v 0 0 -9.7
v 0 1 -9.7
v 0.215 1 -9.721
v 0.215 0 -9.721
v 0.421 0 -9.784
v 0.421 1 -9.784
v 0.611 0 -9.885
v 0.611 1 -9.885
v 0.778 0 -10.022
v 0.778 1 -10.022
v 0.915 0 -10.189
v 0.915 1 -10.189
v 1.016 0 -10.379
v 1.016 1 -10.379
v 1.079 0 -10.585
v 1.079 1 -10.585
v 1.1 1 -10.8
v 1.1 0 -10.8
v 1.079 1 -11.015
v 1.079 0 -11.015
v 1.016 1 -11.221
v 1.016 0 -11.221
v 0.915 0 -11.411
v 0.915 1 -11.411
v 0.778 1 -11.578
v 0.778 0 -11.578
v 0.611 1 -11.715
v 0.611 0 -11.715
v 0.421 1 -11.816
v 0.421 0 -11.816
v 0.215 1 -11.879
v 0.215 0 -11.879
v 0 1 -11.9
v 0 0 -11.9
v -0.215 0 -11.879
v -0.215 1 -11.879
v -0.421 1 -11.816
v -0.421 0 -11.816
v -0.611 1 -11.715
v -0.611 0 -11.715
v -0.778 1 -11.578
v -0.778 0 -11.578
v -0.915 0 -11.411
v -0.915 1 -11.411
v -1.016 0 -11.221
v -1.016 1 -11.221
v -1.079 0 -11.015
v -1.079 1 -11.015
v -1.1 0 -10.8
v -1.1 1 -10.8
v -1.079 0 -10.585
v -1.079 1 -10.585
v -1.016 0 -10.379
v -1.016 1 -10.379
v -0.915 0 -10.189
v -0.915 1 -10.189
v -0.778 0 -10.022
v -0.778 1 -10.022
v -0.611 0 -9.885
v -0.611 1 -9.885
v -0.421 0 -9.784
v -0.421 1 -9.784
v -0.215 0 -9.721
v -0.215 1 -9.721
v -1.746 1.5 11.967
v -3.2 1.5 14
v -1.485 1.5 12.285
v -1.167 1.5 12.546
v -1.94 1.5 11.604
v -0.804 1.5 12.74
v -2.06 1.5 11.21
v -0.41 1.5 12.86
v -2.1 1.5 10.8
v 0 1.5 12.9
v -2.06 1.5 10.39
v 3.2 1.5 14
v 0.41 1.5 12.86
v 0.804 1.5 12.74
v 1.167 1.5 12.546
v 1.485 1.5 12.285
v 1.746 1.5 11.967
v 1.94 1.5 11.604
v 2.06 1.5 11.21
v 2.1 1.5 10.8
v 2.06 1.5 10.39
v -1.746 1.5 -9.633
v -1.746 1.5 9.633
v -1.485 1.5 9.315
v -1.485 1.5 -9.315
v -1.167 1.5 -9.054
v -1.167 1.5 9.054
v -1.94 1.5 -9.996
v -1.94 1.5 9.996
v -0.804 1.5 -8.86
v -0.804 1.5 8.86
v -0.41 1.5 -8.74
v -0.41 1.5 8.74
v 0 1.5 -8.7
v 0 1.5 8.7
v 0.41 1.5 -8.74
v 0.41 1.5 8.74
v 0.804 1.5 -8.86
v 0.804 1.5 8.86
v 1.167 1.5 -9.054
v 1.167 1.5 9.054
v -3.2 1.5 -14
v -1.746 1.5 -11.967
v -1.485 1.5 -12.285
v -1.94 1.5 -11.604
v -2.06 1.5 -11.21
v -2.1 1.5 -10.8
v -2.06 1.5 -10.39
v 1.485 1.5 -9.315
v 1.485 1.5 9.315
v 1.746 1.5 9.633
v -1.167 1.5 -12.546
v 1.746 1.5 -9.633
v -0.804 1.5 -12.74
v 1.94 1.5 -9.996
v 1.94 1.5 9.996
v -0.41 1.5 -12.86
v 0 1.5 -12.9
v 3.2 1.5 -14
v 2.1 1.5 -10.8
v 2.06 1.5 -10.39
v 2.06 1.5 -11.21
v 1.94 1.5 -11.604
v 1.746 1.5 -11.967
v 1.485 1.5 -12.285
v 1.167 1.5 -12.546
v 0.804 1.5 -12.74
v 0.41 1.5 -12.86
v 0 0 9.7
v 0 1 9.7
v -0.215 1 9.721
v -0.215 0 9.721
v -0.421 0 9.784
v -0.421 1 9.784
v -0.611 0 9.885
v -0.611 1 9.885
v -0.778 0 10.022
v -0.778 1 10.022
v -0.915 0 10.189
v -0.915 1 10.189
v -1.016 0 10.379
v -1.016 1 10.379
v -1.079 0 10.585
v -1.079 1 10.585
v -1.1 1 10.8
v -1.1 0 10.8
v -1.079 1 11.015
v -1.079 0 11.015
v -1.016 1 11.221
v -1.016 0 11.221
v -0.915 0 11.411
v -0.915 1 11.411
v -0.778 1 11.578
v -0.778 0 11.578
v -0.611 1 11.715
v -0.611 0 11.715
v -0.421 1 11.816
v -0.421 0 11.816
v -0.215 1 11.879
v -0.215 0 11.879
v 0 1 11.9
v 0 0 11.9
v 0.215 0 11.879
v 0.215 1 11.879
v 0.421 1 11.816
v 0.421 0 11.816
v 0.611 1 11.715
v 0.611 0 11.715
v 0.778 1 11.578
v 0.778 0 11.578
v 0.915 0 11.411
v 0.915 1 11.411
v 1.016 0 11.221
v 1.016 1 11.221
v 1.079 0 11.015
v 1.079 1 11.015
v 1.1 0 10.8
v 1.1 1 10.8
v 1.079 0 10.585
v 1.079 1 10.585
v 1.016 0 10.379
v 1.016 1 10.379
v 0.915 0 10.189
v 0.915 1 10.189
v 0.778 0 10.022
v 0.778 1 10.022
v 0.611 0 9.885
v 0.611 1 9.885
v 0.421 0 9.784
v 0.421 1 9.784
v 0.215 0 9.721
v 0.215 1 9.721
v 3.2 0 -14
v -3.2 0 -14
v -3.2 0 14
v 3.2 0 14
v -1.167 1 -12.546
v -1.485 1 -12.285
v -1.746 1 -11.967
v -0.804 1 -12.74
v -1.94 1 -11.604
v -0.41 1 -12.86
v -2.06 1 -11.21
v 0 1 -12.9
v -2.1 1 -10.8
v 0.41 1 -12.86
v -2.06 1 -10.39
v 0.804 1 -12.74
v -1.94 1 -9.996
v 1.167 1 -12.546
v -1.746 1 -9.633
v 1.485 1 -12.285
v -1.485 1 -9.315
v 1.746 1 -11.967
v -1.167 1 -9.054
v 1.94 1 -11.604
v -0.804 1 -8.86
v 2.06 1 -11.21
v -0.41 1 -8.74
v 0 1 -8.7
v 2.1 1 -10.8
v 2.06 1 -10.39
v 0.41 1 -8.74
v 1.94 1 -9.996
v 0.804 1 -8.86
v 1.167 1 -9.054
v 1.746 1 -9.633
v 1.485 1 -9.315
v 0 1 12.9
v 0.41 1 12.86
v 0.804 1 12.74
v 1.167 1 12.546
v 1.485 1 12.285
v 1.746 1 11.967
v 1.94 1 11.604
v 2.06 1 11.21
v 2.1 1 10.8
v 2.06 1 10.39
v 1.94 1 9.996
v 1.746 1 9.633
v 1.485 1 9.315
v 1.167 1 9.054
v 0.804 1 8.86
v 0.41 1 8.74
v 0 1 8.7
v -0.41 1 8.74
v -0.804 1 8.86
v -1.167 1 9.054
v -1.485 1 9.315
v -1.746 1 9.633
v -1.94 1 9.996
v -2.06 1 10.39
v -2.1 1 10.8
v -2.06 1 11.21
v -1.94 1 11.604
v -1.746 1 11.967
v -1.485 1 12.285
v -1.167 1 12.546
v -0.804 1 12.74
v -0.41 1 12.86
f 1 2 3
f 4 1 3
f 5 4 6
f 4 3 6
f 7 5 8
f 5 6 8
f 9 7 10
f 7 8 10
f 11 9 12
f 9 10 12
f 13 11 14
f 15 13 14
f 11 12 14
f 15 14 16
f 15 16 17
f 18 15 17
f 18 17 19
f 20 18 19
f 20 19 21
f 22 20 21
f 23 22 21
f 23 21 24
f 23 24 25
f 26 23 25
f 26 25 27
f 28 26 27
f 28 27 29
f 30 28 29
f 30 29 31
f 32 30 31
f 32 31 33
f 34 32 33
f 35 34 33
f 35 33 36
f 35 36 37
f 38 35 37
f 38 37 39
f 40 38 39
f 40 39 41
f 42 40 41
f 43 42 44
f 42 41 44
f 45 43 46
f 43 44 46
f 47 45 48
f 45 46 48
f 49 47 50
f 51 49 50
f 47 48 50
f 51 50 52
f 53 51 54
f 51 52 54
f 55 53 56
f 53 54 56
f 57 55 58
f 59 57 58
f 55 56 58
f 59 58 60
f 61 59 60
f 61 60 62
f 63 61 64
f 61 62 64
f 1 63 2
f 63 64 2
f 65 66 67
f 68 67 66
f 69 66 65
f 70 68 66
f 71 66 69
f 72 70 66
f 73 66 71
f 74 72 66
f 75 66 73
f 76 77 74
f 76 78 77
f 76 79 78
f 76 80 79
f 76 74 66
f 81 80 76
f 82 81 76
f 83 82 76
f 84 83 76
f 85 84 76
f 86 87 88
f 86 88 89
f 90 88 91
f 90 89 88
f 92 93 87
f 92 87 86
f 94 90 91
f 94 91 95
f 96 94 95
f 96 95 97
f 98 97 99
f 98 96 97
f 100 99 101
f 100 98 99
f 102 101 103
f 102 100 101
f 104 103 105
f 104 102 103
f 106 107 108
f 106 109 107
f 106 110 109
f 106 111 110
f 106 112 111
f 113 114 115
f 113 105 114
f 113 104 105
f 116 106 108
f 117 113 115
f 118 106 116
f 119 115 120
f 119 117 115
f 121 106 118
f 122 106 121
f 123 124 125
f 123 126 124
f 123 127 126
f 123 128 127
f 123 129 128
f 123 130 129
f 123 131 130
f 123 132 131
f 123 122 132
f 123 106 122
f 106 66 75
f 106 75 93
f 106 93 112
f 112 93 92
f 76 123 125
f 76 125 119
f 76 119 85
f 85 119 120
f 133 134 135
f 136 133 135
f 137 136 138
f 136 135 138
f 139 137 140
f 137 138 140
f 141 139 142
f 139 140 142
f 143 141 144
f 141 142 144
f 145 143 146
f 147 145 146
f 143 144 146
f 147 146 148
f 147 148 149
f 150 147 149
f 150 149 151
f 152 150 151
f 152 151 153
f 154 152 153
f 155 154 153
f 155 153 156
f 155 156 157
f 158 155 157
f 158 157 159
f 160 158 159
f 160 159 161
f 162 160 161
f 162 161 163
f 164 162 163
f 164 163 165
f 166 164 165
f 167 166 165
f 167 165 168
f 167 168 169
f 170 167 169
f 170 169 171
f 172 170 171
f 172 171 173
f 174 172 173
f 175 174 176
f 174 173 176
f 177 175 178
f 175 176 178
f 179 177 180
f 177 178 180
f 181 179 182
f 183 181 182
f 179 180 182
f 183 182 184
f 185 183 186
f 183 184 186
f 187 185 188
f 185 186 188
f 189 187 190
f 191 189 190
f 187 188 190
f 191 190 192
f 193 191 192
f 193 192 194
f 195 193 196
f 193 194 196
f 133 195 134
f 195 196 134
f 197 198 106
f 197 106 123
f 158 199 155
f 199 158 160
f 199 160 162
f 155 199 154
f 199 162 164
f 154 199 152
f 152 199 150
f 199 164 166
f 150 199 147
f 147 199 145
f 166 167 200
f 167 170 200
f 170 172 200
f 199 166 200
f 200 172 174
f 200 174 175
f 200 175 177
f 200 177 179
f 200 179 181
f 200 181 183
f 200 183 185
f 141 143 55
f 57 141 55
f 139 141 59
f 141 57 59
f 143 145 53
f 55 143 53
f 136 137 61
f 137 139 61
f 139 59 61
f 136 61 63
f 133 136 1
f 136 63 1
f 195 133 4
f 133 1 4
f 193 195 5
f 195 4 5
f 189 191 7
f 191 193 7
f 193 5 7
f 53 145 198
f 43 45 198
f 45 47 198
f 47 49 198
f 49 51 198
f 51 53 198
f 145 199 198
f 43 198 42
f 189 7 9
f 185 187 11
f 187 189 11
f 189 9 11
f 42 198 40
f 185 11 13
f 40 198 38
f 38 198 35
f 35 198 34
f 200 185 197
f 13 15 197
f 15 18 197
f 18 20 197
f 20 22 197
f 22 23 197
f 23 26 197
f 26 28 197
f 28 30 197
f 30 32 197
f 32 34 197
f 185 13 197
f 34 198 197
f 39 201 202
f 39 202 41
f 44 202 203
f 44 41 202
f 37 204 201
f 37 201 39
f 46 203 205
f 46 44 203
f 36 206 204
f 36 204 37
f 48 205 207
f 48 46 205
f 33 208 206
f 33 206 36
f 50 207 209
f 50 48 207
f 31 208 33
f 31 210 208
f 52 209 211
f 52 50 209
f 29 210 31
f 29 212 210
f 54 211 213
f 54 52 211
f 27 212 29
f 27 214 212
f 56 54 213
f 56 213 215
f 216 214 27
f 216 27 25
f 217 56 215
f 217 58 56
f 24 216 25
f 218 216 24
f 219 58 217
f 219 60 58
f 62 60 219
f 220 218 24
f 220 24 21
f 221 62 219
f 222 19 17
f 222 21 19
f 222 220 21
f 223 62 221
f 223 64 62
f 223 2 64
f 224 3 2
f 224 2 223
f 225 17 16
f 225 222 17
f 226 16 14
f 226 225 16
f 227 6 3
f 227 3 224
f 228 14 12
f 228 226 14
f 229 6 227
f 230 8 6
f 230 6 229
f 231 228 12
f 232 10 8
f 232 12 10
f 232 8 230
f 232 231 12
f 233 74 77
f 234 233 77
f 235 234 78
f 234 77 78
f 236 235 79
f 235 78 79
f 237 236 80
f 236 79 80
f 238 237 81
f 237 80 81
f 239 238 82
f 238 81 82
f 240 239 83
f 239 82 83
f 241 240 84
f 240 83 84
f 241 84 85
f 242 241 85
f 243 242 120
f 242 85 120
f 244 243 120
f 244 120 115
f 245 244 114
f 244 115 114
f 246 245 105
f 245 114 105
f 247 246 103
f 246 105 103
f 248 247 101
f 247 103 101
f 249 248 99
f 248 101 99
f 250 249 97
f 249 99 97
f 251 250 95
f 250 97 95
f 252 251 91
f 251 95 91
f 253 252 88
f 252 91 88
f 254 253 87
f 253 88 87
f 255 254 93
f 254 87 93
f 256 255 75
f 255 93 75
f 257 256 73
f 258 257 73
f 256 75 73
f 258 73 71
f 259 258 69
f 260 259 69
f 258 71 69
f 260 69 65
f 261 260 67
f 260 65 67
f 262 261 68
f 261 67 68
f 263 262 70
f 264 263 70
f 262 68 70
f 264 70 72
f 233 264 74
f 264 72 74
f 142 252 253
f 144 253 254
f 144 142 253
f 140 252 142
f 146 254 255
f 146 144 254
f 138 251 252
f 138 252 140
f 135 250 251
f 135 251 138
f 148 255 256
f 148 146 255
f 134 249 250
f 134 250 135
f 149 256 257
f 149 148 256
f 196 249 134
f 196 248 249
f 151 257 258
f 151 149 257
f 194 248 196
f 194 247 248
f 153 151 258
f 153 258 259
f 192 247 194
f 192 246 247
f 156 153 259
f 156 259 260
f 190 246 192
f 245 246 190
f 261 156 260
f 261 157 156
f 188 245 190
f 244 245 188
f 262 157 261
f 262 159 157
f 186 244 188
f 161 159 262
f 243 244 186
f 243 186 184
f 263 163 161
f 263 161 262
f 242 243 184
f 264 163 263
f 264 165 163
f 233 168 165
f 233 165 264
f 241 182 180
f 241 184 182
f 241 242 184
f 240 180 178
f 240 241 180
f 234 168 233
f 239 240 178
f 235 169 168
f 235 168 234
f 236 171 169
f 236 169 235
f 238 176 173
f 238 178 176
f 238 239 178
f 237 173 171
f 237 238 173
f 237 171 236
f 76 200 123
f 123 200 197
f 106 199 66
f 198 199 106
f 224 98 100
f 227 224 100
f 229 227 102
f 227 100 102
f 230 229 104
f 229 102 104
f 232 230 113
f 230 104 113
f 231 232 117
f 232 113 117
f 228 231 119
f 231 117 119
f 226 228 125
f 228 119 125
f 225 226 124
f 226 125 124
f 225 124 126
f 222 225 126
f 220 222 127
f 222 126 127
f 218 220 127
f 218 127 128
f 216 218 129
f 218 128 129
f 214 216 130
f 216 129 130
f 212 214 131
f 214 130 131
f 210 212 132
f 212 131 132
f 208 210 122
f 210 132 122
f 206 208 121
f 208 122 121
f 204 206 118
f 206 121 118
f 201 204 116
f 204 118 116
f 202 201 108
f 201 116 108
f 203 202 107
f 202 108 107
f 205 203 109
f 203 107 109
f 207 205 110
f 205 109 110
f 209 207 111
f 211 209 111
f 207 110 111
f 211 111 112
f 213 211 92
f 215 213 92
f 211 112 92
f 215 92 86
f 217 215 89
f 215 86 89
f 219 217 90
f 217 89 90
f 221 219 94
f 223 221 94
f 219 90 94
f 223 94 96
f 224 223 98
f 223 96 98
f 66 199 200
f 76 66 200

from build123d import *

# Parameters (mm, degrees)
SKETCH_1_W          = 6.4
SKETCH_1_H          = 28
EXTRUDE_1_DEPTH     = 1.5
SKETCH_2_R          = 1.1
CUT_EXTRUDE_1_DEPTH = 15.439182802
SKETCH_3_R          = 2.1
CUT_EXTRUDE_2_DEPTH = 0.5


with BuildPart() as part:
    # Эскиз1 → Бобышка-Вытянуть1 (new body)
    with BuildSketch(Plane(origin=(0, 0, 0), x_dir=(1, 0, 0), z_dir=(0, 1, 0))):
        Rectangle(SKETCH_1_W, SKETCH_1_H)
    extrude(amount=EXTRUDE_1_DEPTH)

    # Эскиз2 → Вырез-Вытянуть1 (cut, through all)
    with BuildSketch(Plane(origin=(0, 1.5, 0), x_dir=(1, 0, 0), z_dir=(0, 1, 0))):
        with Locations(Location((0, 10.8, 0), (0, 0, 270))):
            Circle(SKETCH_2_R)
        with Locations(Location((0, -10.8, 0), (0, 0, 90))):
            Circle(SKETCH_2_R)
    extrude(amount=-CUT_EXTRUDE_1_DEPTH, mode=Mode.SUBTRACT)

    # Эскиз3 → Вырез-Вытянуть2 (cut)
    with BuildSketch(Plane(origin=(0, 1.5, 0), x_dir=(1, 0, 0), z_dir=(0, 1, 0))):
        with Locations(Location((0, 10.8, 0), (0, 0, 270))):
            Circle(SKETCH_3_R)
        with Locations(Location((0, -10.8, 0), (0, 0, 270))):
            Circle(SKETCH_3_R)
    extrude(amount=-CUT_EXTRUDE_2_DEPTH, mode=Mode.SUBTRACT)


solid = part.part
